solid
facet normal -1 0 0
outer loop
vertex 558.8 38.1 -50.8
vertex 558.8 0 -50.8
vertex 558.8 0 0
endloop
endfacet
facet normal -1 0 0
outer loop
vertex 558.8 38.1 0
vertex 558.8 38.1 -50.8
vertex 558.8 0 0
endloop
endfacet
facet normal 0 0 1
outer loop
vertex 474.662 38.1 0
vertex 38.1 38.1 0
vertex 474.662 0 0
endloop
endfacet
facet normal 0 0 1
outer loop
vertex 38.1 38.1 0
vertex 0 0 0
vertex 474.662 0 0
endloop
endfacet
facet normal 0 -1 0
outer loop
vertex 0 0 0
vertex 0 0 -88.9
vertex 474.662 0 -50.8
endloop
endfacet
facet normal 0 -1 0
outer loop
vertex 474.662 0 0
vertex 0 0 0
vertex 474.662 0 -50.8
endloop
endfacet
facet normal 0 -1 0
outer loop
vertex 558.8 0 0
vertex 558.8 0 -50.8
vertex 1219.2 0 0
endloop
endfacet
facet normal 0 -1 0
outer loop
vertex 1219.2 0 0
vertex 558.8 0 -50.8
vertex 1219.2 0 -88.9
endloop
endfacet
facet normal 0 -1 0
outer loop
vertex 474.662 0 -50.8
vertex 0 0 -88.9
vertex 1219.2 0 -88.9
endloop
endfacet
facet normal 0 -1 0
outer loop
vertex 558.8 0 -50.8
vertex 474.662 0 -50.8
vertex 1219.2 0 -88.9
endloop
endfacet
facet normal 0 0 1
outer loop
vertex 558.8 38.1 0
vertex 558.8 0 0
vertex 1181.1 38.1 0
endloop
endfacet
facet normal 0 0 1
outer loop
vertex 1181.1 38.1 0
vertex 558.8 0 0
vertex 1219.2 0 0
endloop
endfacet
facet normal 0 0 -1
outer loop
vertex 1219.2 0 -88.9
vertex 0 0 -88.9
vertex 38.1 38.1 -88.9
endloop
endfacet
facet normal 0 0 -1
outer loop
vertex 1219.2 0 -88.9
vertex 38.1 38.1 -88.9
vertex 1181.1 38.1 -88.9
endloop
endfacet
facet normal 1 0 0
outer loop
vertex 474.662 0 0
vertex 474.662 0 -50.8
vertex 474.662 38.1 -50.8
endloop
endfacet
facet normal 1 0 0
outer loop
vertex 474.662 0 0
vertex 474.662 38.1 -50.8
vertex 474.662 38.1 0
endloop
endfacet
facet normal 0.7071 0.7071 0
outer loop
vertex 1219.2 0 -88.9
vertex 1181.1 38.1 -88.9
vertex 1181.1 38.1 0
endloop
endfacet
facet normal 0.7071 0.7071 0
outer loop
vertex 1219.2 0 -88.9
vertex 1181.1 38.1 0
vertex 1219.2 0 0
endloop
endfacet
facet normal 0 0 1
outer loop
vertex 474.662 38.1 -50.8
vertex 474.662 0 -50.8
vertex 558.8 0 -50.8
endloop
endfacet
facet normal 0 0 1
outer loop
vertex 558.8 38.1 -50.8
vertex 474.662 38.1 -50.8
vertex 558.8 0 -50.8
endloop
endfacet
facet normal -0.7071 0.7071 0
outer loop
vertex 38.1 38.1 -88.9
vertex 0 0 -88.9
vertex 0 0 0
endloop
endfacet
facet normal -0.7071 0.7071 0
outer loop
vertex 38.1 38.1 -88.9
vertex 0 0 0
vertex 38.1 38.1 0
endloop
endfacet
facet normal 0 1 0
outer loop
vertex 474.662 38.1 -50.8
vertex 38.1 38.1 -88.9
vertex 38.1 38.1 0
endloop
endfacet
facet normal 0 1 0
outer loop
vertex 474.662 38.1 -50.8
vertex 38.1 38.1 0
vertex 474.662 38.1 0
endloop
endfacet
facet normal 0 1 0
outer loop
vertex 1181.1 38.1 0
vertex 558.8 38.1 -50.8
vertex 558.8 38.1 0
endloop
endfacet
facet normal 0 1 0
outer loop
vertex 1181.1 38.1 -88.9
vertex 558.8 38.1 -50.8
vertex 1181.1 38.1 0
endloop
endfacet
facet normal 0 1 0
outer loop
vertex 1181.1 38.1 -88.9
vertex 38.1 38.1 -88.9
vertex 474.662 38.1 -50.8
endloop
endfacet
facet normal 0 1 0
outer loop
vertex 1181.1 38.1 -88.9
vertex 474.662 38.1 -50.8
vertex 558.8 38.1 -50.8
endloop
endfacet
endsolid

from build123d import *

# Parameters (mm, degrees)
SKETCH1_W           = 1219.2
SKETCH1_H           = 88.9
BOSS_EXTRUDE1_DEPTH = 38.1
CUT_EXTRUDE1_DEPTH  = 89.9
SKETCH3_W           = 84.1375
SKETCH3_H           = 50.8
CUT_EXTRUDE2_DEPTH  = 39.1


with BuildPart() as part:
    # Sketch1 → Boss-Extrude1 (new body)
    with BuildSketch(Plane(origin=(0, 0, 0), x_dir=(1, 0, 0), z_dir=(0, 1, 0))):
        with Locations((609.6, 44.45)):
            Rectangle(SKETCH1_W, SKETCH1_H)
    extrude(amount=BOSS_EXTRUDE1_DEPTH)

    # Sketch2 → Cut-Extrude1 (cut, through all)
    with BuildSketch(Plane.XY):
        Polygon((0, 0), (38.1, 38.1), (0, 38.1), align=None)
        Polygon((1219.2, 0), (1219.2, 38.1), (1181.1, 38.1), align=None)
    extrude(amount=-CUT_EXTRUDE1_DEPTH, mode=Mode.SUBTRACT)

    # Sketch3 → Cut-Extrude2 (cut, through all)
    with BuildSketch(Plane.XZ):
        with Locations((516.73125, -25.4)):
            Rectangle(SKETCH3_W, SKETCH3_H)
    extrude(amount=-CUT_EXTRUDE2_DEPTH, mode=Mode.SUBTRACT)


solid = part.part
